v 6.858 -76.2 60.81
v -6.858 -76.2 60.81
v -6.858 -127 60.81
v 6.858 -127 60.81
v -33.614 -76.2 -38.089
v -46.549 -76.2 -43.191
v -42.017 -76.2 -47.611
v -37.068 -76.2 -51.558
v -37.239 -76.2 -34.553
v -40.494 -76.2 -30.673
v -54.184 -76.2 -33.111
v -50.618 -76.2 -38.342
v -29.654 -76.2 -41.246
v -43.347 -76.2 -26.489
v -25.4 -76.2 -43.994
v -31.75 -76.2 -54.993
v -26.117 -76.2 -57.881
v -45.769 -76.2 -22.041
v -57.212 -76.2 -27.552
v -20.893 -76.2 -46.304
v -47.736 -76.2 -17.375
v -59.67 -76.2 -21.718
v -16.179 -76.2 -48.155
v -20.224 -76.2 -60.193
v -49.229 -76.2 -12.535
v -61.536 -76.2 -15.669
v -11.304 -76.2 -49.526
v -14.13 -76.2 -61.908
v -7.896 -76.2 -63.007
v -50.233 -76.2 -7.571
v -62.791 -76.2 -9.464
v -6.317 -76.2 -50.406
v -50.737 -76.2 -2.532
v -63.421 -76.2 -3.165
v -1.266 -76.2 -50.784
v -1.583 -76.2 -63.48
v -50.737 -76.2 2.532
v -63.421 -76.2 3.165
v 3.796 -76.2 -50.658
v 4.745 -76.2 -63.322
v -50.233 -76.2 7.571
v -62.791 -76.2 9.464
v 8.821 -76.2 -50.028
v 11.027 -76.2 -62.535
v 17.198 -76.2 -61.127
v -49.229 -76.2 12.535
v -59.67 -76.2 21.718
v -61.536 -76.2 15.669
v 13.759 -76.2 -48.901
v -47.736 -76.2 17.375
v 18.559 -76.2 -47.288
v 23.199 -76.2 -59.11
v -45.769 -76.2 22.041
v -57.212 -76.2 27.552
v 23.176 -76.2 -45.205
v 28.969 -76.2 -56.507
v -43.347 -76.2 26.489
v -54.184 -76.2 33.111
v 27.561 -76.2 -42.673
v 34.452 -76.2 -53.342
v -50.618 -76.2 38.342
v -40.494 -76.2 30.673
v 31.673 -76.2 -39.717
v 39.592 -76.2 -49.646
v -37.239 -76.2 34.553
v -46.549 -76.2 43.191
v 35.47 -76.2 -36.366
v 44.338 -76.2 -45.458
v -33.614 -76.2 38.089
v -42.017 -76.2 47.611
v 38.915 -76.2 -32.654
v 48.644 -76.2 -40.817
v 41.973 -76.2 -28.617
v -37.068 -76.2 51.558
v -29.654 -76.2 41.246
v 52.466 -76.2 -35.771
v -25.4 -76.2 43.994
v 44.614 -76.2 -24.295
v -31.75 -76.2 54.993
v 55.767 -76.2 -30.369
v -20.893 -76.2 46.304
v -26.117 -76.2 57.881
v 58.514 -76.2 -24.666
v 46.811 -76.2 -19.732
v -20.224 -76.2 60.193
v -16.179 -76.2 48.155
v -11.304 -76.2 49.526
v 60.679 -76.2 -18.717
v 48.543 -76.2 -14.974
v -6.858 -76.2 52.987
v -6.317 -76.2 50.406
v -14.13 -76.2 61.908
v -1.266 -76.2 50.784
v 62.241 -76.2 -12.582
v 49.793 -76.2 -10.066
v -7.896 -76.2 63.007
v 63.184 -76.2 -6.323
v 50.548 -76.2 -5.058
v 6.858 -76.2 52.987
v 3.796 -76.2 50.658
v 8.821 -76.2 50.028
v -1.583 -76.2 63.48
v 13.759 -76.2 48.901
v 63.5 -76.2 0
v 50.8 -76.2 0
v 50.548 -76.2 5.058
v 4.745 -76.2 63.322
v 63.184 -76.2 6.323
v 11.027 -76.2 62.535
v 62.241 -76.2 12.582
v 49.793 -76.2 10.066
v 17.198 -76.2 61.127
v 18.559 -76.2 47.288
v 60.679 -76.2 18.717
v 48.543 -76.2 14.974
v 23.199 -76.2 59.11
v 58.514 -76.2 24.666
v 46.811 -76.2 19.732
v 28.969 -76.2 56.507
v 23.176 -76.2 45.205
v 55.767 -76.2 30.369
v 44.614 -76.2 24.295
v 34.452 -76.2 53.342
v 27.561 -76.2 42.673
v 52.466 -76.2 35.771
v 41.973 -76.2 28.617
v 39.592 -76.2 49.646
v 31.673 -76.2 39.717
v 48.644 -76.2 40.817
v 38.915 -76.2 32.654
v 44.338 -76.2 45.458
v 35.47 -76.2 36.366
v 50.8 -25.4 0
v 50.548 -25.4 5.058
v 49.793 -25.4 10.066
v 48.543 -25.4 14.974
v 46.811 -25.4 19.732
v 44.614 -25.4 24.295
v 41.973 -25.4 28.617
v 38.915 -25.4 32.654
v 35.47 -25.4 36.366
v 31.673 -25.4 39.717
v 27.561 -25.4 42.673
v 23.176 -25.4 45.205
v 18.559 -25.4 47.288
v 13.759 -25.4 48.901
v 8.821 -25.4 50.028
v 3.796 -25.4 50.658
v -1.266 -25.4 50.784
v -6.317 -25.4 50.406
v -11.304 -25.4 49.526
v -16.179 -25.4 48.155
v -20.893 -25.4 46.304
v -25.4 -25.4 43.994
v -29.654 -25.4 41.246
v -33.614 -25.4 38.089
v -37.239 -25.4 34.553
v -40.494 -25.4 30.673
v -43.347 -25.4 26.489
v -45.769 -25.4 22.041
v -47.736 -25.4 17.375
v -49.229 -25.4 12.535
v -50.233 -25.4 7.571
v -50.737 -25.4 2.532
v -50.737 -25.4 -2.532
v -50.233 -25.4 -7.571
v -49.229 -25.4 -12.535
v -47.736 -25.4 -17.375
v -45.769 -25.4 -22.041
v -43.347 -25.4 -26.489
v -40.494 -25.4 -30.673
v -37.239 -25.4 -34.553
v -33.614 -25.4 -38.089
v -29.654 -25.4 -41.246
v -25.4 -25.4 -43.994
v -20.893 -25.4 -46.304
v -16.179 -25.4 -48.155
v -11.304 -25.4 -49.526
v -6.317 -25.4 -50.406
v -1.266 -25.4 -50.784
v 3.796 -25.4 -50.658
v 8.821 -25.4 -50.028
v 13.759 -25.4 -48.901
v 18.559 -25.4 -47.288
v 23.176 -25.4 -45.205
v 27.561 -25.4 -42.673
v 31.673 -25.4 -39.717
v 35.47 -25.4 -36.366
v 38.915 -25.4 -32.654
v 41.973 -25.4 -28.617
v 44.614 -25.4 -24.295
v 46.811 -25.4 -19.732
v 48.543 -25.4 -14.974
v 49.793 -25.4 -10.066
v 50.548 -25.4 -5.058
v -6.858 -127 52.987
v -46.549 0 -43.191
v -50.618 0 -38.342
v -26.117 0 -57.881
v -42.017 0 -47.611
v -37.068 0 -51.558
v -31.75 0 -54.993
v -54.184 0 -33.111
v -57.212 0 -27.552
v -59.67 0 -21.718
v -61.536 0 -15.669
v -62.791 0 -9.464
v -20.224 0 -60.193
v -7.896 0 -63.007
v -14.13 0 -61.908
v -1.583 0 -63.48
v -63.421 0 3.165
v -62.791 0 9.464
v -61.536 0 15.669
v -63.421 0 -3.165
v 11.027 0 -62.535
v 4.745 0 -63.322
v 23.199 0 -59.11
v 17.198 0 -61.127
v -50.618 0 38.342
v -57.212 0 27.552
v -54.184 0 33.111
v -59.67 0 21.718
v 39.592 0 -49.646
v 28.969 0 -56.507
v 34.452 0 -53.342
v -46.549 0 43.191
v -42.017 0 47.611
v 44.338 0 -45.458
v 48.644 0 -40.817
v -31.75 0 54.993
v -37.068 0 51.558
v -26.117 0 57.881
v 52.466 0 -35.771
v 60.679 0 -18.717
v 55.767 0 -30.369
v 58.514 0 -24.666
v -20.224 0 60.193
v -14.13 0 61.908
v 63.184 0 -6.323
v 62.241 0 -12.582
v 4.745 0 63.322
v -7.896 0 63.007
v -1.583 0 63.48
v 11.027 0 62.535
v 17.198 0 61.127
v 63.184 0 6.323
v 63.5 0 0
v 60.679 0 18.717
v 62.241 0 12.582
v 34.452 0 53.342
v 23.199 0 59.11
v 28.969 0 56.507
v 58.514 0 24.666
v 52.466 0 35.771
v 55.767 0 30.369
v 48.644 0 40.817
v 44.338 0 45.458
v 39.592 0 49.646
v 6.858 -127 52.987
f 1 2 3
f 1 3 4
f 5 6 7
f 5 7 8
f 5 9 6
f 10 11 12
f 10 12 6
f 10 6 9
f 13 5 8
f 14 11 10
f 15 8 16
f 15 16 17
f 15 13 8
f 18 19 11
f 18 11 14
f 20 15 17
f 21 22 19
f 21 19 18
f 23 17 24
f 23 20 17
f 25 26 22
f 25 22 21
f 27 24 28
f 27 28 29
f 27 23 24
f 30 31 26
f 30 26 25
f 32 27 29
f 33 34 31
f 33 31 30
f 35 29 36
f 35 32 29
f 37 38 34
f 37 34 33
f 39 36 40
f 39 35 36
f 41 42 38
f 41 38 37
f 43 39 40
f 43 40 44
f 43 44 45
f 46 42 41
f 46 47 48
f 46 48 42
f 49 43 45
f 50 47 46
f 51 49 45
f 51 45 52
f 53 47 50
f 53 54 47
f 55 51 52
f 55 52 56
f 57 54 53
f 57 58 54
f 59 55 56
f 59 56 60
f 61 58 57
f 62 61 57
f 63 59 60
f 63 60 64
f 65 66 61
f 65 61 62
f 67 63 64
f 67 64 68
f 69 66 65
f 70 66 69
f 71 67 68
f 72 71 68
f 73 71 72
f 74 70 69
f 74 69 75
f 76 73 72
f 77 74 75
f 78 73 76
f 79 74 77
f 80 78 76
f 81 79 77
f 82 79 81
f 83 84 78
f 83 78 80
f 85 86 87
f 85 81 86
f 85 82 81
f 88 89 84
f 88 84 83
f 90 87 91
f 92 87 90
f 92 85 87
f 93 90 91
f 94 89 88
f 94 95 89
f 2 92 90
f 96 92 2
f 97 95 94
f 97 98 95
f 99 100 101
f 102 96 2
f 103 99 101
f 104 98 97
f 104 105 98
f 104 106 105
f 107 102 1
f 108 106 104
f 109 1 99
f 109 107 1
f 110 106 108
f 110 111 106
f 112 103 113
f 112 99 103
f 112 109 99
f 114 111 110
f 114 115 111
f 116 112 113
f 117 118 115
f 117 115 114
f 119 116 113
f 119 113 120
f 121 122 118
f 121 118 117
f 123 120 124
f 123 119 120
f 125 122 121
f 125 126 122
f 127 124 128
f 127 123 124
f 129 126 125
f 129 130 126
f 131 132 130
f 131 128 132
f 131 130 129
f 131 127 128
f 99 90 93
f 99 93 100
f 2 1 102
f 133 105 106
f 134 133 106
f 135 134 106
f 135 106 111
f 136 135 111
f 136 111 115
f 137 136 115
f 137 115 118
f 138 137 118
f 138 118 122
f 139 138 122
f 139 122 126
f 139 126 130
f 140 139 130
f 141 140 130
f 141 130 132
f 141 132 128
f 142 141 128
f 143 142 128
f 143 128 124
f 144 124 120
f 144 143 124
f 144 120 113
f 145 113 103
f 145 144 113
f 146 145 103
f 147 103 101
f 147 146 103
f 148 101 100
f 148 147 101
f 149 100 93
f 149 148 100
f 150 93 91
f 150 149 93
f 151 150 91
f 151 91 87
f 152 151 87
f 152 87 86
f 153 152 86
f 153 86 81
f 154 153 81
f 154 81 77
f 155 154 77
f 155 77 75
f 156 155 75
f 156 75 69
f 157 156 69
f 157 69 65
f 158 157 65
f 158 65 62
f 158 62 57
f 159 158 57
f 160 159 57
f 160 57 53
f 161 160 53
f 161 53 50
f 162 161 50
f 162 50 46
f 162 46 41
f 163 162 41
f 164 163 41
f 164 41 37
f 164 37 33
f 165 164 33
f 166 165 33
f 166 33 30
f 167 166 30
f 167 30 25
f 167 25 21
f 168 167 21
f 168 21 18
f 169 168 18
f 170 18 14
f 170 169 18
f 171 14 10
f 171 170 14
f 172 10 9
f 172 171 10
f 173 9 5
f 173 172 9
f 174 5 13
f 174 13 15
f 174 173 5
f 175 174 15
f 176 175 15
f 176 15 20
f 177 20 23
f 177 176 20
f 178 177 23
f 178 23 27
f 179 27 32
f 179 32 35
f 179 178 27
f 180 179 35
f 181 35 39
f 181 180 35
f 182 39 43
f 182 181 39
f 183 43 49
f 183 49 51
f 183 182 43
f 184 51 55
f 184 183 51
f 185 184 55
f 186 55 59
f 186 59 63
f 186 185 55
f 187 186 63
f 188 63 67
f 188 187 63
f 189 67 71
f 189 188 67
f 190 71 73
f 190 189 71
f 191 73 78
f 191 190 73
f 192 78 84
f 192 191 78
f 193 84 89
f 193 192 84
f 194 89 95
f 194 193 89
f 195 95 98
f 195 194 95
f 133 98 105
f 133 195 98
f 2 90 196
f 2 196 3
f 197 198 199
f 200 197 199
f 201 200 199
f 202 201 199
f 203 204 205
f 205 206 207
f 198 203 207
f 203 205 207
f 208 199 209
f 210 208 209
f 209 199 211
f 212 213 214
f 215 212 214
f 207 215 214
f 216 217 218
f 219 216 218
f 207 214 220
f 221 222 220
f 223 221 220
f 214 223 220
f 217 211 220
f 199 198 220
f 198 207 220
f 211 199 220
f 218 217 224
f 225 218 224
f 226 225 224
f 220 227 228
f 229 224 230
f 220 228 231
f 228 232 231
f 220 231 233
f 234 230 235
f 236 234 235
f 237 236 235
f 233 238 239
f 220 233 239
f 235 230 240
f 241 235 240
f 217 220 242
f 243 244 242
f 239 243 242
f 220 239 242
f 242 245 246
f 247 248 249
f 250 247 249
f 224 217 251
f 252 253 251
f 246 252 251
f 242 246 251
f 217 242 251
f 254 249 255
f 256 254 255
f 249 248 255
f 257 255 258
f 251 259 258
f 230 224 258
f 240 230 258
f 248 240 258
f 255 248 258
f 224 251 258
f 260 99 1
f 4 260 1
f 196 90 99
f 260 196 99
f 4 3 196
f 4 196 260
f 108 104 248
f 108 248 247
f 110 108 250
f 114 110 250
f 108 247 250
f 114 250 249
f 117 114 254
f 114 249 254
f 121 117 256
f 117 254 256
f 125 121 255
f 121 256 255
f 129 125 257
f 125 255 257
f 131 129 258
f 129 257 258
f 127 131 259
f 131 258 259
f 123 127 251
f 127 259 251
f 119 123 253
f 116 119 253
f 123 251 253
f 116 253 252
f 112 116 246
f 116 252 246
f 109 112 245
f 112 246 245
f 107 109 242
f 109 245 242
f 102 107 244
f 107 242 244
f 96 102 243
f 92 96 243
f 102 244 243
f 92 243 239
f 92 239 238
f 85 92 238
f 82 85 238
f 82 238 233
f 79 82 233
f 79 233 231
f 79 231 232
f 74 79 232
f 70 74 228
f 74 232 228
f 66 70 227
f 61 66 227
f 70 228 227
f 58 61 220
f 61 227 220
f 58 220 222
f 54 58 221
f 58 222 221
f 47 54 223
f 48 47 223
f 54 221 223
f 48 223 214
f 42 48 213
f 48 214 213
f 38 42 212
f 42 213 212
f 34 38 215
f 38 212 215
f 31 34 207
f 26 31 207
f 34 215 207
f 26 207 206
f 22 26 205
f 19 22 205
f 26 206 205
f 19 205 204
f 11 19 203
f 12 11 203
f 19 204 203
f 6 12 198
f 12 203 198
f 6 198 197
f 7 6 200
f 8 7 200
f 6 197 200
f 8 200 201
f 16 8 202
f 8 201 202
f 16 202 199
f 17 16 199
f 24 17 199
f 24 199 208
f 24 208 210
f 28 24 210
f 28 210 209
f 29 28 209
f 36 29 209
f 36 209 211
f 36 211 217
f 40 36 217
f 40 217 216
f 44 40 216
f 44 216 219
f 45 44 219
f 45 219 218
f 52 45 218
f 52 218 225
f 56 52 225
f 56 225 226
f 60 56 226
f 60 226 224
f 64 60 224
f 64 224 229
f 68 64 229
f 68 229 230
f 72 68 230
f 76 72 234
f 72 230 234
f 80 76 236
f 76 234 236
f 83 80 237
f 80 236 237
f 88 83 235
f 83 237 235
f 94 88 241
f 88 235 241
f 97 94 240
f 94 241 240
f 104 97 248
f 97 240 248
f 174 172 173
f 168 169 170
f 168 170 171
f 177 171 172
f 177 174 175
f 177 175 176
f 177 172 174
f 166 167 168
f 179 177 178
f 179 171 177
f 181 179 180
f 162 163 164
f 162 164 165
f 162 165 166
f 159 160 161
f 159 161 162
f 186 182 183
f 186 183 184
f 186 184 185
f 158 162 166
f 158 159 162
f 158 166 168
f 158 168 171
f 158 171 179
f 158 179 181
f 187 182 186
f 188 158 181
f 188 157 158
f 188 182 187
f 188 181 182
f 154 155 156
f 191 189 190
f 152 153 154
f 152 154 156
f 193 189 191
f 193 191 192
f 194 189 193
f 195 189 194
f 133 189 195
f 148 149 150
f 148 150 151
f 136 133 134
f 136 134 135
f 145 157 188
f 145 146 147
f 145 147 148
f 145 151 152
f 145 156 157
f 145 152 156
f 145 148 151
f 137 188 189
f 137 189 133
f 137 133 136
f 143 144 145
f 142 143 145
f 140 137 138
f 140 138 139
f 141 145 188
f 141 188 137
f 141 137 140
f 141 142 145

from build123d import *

# Parameters (mm, degrees)
F0_R     = 63.5
F0_R_2   = 50.8
F0_W     = 13.716
F0_H     = 7.8232
F1_DEPTH = 76.2
F2_DEPTH = 25.4
F3_DEPTH = 127


with BuildPart() as f1:
    # F0 (on Front) → F1 (new body)
    with BuildSketch(Plane.XZ):
        Circle(F0_R)
        Circle(F0_R_2, mode=Mode.SUBTRACT)
        with Locations((0, 56.898177)):
            Rectangle(F0_W, F0_H, mode=Mode.SUBTRACT)
    extrude(amount=F1_DEPTH)

    # F0 (on Front) → F2 (join)
    with BuildSketch(Plane.XZ):
        Circle(F0_R_2)
    extrude(amount=F2_DEPTH)

    # F0 (on Front) → F3 (join)
    with BuildSketch(Plane.XZ):
        with Locations((0, 56.898177)):
            Rectangle(F0_W, F0_H)
    extrude(amount=F3_DEPTH)


solid = f1.part
